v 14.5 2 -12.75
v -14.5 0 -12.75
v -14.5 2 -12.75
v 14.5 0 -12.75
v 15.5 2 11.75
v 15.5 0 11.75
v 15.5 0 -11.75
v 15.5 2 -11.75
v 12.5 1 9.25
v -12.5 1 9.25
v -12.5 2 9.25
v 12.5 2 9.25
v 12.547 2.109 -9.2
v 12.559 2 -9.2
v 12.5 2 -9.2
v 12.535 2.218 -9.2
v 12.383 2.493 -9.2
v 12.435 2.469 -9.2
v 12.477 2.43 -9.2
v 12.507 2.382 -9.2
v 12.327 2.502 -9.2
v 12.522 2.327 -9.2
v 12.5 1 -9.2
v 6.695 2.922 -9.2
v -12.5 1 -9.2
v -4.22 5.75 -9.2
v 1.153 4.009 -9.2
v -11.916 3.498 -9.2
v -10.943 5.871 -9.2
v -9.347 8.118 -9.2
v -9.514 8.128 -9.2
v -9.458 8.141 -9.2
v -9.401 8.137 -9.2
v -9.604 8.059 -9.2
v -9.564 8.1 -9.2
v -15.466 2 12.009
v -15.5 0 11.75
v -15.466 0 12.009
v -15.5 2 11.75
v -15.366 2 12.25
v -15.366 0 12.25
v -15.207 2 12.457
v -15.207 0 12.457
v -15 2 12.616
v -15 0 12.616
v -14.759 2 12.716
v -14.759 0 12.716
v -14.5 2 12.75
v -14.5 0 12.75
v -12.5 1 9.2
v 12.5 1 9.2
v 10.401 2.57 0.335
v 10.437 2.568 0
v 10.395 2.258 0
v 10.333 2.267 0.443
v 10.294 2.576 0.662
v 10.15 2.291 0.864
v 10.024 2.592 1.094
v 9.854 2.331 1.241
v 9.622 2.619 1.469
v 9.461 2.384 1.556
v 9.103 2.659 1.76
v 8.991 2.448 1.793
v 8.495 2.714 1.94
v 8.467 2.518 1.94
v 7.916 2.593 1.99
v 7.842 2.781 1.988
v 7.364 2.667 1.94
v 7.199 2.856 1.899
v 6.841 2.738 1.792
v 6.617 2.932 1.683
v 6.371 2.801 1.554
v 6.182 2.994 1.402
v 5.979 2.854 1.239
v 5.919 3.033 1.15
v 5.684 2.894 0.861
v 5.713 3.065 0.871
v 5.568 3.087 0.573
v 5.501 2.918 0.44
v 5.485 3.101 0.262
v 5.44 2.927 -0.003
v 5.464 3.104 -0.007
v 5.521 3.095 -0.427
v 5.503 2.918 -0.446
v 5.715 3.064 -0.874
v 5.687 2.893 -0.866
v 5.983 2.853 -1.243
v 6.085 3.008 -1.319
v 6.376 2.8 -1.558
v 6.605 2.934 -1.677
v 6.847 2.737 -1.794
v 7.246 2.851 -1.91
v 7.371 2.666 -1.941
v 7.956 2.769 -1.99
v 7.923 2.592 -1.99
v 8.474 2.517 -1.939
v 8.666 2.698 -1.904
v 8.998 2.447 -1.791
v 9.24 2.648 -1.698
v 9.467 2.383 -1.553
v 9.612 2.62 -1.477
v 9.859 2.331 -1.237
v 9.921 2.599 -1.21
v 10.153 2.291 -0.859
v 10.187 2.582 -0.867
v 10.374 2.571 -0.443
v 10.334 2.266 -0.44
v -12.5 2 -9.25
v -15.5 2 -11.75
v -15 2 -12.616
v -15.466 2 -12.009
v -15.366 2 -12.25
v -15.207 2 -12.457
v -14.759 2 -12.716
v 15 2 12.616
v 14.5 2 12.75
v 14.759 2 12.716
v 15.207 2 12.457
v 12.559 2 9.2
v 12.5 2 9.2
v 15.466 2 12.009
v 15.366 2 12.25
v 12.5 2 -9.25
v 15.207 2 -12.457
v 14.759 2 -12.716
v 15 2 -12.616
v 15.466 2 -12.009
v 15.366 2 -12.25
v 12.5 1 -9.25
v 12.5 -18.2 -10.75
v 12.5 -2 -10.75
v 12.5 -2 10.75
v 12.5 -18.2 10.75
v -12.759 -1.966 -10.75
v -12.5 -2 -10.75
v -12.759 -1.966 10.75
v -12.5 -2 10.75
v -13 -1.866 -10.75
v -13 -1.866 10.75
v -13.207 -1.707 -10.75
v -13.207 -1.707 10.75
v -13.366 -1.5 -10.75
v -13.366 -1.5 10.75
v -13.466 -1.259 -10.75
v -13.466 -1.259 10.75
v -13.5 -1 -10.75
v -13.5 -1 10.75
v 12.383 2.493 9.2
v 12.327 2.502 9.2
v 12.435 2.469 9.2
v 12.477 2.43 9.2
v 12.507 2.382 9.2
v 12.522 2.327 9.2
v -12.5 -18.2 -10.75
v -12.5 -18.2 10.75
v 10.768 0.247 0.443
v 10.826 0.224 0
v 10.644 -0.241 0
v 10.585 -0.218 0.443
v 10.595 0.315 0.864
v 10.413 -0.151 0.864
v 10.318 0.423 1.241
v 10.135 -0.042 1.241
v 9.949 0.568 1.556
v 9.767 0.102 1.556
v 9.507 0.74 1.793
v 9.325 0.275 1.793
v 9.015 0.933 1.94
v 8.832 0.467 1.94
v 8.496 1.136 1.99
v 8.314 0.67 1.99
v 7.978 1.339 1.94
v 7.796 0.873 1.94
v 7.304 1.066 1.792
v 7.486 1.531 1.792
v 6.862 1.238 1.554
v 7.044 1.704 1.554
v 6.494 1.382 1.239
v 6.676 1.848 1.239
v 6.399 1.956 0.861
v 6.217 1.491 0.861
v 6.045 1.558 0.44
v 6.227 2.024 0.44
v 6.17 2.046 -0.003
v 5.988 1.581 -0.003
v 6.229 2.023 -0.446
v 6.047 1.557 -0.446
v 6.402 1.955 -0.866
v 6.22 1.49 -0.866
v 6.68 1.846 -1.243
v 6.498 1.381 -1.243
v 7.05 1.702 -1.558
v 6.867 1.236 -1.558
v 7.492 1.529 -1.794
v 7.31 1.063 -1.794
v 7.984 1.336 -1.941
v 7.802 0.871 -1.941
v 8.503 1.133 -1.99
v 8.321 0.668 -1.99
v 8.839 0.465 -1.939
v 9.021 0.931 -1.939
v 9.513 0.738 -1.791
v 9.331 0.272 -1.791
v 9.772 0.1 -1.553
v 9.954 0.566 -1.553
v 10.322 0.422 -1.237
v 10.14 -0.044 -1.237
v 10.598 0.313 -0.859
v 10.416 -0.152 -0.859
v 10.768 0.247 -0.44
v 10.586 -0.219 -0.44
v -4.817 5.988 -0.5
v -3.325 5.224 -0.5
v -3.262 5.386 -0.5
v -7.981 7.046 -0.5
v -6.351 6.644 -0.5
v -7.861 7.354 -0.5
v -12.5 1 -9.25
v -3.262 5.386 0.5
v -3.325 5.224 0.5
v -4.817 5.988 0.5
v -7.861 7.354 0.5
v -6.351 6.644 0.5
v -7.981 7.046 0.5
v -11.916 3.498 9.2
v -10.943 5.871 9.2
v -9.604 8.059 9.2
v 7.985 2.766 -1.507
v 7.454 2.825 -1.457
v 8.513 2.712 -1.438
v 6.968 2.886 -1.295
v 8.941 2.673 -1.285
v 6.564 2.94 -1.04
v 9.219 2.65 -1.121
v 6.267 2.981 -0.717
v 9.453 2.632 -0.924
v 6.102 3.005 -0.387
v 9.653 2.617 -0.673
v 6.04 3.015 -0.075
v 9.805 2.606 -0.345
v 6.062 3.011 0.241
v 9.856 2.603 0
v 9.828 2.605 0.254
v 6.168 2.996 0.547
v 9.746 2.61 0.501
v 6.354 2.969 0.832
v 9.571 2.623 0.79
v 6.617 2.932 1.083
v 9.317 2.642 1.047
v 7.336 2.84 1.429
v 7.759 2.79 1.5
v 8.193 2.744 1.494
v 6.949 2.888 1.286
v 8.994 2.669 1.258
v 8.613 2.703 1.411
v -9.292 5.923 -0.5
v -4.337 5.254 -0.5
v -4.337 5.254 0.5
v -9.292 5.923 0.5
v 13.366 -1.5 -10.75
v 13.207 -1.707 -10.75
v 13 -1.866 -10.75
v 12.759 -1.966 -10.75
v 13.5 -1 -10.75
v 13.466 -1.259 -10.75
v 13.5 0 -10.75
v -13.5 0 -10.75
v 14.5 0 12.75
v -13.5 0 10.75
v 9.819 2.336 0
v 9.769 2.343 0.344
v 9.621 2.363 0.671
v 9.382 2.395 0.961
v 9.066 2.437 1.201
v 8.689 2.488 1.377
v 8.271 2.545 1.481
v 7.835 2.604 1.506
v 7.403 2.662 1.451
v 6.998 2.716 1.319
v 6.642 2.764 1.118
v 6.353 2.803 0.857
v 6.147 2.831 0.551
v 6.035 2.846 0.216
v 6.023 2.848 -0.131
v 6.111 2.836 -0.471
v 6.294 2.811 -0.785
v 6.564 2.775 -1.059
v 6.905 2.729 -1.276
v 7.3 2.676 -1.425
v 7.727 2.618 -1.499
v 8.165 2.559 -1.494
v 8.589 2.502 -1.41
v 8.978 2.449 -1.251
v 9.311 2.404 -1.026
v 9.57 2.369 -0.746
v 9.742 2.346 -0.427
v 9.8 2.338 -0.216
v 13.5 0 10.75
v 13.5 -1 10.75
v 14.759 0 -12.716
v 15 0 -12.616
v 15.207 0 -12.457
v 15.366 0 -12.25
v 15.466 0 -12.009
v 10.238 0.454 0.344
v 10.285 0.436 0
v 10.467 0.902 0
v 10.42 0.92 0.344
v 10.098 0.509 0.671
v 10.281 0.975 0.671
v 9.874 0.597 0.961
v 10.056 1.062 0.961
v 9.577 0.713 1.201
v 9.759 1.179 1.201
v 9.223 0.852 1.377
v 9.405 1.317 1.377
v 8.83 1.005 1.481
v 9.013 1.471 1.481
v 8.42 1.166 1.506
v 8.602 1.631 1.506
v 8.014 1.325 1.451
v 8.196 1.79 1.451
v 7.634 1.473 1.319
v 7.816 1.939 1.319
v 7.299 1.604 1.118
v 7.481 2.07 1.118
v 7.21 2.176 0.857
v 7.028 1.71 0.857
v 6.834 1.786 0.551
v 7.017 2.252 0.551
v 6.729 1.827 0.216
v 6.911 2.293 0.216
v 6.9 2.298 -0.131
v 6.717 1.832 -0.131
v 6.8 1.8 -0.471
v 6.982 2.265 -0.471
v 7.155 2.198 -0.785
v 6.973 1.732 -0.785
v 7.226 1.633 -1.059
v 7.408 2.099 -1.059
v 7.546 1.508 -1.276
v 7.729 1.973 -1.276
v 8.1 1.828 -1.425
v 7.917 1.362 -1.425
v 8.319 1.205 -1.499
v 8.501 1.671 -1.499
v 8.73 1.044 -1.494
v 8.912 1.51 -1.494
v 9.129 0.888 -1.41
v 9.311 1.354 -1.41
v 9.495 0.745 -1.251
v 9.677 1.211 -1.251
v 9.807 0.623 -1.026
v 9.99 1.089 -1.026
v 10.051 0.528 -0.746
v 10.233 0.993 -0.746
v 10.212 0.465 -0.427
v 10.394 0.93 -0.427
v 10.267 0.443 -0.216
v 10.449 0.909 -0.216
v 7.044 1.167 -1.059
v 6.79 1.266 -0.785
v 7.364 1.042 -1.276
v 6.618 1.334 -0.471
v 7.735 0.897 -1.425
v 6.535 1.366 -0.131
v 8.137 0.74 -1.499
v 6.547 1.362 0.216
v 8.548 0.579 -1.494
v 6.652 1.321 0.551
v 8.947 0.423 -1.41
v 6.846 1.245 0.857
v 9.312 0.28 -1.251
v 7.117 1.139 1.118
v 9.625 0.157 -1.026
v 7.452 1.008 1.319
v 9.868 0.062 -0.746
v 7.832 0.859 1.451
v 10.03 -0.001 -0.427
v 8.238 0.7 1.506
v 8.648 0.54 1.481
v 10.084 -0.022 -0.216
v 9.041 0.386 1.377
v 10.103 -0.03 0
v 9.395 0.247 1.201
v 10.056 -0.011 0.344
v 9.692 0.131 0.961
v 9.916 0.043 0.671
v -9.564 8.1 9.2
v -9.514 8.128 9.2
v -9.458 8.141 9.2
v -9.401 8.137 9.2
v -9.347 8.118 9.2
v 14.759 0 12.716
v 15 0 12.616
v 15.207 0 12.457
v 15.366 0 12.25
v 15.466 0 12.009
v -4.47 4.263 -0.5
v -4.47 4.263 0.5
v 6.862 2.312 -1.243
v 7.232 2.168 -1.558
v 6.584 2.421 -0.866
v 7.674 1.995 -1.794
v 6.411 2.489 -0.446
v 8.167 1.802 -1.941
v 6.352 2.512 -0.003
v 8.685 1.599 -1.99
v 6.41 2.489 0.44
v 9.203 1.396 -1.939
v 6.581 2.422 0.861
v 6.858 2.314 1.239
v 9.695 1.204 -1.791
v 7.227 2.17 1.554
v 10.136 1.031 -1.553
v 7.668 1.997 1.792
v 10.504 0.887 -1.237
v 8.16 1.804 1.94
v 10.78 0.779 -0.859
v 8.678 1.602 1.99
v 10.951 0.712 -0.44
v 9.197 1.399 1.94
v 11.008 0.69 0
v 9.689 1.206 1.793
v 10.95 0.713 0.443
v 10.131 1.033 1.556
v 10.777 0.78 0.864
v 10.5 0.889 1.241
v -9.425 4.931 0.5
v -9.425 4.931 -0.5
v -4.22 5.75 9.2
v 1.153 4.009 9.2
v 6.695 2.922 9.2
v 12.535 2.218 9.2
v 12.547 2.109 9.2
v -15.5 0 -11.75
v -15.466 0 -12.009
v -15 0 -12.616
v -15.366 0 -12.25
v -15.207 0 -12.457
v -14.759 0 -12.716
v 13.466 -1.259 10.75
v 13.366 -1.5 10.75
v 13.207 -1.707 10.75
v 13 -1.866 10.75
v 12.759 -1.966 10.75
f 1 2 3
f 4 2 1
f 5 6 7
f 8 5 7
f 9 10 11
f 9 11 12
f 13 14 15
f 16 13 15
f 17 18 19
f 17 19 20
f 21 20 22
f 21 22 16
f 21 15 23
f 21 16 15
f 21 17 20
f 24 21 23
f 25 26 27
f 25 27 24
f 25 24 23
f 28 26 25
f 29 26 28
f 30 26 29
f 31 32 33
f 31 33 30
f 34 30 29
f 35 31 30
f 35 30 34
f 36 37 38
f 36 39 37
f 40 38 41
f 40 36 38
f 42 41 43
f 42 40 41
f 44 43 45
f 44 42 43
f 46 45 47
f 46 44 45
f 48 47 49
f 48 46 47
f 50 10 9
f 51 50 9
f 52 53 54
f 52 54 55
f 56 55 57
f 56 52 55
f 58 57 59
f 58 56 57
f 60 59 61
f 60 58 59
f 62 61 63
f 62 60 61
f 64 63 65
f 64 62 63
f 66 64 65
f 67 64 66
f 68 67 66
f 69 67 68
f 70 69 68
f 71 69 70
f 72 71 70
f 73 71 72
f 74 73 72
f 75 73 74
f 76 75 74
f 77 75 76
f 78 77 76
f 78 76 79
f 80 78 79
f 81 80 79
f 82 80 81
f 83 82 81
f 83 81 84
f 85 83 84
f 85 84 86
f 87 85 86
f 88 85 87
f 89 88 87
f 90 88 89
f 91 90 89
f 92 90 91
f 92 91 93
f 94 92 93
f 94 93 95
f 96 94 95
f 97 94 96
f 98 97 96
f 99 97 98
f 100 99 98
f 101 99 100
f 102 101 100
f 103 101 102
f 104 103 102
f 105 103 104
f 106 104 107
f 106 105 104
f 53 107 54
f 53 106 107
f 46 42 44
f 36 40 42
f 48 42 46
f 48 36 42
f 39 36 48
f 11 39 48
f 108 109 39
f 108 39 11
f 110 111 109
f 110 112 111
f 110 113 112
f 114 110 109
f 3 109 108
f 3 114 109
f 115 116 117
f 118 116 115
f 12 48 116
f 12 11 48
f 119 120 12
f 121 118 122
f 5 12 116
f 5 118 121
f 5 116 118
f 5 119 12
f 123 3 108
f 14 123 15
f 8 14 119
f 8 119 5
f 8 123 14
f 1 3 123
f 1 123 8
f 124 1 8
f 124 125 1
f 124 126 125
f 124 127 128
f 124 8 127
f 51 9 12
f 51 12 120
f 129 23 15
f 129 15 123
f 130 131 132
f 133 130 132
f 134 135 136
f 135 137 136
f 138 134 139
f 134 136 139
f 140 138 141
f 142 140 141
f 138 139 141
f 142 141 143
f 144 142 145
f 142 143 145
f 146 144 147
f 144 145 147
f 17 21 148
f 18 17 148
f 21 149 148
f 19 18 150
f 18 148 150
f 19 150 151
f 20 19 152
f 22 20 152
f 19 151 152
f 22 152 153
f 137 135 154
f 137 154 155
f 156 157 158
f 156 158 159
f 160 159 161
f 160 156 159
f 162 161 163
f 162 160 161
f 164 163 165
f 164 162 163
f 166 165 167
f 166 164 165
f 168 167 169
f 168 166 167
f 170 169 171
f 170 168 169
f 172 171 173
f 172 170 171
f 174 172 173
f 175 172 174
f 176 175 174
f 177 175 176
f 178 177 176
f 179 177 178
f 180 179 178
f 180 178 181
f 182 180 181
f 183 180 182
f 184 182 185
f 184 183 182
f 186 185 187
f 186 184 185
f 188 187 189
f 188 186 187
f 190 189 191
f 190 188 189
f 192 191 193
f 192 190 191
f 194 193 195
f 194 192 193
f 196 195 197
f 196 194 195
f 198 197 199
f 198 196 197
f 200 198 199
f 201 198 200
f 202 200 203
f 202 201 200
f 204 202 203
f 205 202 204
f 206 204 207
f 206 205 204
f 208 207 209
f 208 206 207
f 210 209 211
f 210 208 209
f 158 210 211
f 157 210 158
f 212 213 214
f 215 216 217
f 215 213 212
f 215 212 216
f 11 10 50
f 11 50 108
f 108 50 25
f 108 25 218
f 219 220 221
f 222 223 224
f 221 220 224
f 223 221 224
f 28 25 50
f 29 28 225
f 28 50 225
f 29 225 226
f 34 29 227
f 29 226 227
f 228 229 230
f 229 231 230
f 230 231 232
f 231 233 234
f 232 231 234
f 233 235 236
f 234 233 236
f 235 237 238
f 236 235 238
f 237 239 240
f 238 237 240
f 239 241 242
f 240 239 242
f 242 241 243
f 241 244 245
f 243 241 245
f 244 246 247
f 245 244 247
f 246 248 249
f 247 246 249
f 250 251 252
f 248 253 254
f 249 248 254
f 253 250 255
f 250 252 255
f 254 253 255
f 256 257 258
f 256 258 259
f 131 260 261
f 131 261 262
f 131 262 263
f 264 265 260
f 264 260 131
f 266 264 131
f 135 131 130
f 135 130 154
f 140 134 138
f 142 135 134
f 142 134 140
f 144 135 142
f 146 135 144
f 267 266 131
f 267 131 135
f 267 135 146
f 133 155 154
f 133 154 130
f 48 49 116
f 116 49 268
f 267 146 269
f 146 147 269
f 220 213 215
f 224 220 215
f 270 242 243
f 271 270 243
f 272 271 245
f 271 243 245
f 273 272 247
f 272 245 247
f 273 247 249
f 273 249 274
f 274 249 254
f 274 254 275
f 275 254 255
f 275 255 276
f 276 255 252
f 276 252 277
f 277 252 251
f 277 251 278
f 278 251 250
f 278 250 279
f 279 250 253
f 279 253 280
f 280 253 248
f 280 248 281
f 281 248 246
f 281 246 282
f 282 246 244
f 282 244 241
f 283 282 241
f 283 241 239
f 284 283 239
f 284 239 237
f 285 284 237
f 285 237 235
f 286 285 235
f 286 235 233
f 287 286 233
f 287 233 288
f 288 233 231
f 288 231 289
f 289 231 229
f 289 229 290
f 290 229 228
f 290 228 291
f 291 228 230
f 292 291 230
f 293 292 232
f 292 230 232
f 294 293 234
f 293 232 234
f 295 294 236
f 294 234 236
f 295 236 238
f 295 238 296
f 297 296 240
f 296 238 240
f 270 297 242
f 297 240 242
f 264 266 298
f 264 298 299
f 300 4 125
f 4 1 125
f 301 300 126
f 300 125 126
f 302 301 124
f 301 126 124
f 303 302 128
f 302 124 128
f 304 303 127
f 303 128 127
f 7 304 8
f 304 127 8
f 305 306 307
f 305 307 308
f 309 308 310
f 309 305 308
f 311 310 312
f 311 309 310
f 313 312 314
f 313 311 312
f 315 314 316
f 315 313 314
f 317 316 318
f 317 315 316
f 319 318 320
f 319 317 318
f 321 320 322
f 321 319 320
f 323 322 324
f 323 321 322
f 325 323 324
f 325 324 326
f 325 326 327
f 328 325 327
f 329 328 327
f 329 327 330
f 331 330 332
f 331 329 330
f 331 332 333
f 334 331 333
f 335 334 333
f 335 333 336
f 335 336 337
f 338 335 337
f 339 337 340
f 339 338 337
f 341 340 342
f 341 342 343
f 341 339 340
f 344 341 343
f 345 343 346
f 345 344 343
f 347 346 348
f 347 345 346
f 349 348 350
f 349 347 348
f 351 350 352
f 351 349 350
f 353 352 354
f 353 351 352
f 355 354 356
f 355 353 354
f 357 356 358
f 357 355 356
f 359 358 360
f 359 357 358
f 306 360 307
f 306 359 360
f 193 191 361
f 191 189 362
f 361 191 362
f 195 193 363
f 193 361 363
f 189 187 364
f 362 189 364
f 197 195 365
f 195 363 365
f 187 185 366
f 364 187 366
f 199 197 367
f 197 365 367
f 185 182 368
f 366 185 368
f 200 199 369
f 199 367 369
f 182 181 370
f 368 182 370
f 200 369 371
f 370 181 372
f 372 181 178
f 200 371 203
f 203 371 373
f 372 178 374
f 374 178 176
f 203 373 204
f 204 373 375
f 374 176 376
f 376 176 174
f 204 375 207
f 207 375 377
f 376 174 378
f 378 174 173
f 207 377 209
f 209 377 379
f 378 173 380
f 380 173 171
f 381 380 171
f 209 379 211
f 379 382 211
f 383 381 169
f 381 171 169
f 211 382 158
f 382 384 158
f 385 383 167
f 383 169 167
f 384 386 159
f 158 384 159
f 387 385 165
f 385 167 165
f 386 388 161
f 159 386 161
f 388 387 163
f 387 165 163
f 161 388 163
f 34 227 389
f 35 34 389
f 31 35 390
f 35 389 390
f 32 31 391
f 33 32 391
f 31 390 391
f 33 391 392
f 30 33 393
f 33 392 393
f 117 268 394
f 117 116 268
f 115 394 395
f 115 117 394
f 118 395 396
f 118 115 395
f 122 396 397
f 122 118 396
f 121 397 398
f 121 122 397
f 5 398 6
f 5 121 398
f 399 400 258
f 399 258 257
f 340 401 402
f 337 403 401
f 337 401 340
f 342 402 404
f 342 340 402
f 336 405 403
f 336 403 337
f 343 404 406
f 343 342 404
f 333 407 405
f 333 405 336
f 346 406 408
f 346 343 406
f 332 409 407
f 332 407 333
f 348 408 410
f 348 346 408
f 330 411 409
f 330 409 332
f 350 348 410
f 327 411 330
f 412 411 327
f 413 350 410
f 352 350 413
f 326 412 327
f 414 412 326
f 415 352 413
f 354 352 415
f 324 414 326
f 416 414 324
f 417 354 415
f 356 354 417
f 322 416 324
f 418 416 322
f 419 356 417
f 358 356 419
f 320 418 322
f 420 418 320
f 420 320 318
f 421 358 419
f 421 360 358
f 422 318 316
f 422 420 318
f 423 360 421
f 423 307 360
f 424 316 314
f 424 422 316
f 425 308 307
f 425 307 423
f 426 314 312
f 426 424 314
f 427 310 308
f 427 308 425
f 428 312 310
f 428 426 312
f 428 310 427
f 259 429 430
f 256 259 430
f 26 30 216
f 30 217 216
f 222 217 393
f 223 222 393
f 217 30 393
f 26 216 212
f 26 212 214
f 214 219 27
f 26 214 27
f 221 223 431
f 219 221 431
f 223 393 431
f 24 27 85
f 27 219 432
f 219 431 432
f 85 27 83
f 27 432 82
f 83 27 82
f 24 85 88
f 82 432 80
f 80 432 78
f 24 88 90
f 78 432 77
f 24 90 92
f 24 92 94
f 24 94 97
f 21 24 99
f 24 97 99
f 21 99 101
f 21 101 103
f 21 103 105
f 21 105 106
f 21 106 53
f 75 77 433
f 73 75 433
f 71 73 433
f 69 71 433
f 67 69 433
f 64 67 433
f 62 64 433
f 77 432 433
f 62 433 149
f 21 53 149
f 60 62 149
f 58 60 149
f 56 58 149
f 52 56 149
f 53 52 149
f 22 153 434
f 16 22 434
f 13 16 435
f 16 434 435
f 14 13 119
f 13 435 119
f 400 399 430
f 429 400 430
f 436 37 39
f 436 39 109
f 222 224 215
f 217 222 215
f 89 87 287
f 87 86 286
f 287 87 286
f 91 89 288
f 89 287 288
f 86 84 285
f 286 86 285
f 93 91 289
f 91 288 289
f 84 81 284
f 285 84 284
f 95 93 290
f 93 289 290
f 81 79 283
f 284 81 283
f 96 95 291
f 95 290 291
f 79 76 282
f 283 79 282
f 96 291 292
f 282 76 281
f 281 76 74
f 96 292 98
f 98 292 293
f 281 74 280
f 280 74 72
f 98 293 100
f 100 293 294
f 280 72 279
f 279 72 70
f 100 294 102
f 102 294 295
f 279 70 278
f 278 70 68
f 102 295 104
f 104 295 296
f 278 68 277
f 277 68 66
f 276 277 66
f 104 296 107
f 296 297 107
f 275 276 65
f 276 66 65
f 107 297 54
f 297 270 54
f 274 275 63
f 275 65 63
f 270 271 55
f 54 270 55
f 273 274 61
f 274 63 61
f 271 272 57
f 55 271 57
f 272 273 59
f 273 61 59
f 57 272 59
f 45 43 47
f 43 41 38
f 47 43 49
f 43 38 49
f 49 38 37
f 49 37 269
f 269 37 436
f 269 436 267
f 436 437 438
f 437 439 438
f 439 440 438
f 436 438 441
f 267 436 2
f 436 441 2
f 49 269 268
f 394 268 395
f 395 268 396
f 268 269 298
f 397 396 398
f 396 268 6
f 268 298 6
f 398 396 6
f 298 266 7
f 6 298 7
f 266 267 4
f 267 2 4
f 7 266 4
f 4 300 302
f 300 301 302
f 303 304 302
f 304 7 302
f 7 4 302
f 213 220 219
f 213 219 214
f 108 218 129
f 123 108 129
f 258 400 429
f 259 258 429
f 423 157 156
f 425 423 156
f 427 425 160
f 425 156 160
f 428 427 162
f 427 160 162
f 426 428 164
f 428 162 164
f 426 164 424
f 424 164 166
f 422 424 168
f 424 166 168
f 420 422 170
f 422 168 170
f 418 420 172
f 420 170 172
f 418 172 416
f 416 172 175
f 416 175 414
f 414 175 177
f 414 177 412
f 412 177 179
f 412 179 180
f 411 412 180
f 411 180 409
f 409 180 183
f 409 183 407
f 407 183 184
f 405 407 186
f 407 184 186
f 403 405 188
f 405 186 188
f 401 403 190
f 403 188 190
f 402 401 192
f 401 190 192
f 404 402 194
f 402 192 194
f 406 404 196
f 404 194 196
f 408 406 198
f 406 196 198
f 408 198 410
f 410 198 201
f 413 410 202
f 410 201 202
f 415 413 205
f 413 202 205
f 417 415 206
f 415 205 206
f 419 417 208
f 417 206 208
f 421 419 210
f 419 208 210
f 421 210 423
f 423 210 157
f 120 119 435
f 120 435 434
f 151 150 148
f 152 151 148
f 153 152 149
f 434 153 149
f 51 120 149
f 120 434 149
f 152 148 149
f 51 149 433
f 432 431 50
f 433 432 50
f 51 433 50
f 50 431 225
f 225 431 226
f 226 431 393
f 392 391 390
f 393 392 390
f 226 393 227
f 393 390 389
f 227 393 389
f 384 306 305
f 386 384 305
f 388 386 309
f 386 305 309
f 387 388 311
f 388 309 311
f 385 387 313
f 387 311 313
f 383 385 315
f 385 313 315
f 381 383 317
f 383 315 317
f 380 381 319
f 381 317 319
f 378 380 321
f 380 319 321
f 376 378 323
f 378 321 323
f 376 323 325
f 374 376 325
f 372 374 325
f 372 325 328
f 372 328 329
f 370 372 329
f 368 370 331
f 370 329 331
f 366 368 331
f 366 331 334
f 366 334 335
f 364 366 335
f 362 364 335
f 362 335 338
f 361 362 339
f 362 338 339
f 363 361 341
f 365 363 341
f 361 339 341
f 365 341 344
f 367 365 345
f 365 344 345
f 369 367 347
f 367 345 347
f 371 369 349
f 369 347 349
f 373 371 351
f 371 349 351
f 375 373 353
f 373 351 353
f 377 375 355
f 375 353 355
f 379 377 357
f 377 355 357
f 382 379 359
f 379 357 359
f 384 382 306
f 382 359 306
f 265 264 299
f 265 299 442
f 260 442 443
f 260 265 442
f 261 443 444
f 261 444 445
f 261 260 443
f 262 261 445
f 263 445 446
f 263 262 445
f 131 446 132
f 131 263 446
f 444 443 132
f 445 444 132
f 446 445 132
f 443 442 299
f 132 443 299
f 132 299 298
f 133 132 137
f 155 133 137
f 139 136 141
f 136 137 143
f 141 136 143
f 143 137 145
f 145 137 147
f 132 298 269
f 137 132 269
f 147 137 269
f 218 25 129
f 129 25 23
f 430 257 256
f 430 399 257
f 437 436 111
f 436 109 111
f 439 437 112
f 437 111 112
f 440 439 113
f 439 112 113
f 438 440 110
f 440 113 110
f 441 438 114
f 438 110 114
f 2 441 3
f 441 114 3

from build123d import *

# Parameters (mm, degrees)
CROQUIS1_W                   = 31
CROQUIS1_H                   = 25.5
CROQUIS1_W_2                 = 25
CROQUIS1_H_2                 = 18.5
SALIENTE_EXTRUIR1_DEPTH      = 2
REDONDEO1_R                  = 1
CROQUIS2_W                   = 25
CROQUIS2_H                   = 21.5
SALIENTE_EXTRUIR5_DEPTH      = 18.2
SALIENTE_EXTRUIR5_DEPTH_BACK = 1
SALIENTE_EXTRUIR6_DEPTH      = 10.75
SALIENTE_EXTRUIR7_DEPTH      = 9.2
CROQUIS7_RX                  = 2.5
CROQUIS7_RY                  = 1.989859087
CROQUIS7_RX_2                = 1.919157188
CROQUIS7_RY_2                = 1.506996734
CROQUIS7_W                   = 5
CROQUIS7_H                   = 1
CORTAR_EXTRUIR2_DEPTH        = 0.5
CROQUIS8_RX                  = 2.5
CROQUIS8_RY                  = 1.989859087
CROQUIS8_RX_2                = 1.919157188
CROQUIS8_RY_2                = 1.506996734
CROQUIS8_W                   = 5
CROQUIS8_H                   = 1
CORTAR_EXTRUIR3_DEPTH        = 0.5


with BuildPart() as part:
    # Croquis1 → Saliente-Extruir1 (new body)
    with BuildSketch(Plane(origin=(0, 0, 0), x_dir=(1, 0, 0), z_dir=(0, 1, 0))):
        Rectangle(CROQUIS1_W, CROQUIS1_H)
        Rectangle(CROQUIS1_W_2, CROQUIS1_H_2, mode=Mode.SUBTRACT)
    extrude(amount=SALIENTE_EXTRUIR1_DEPTH)

    # Redondeo1
    redondeo1_edges = [part.edges().sort_by_distance(p)[0] for p in [
        (15.5, 1, 12.75),
        (-15.5, 1, 12.75),
        (-15.5, 1, -12.75),
        (15.5, 1, -12.75),
    ]]
    fillet(redondeo1_edges, radius=REDONDEO1_R)

    # Croquis2 → Saliente-Extruir5 (add, two sides)
    with BuildSketch(Plane.XZ) as saliente_extruir5_sk:
        Rectangle(CROQUIS2_W, CROQUIS2_H)
    extrude(amount=SALIENTE_EXTRUIR5_DEPTH)
    extrude(saliente_extruir5_sk.sketch, amount=-SALIENTE_EXTRUIR5_DEPTH_BACK)

    # Croquis3 → Saliente-Extruir6 (add, symmetric)
    with BuildSketch(Plane.XY):
        with BuildLine():
            Line((12.5, 0), (13.5, 0))
            Line((13.5, 0), (13.5, -1))
            ThreePointArc((13.5, -1), (13.207106781, -1.707106781), (12.5, -2))
            Line((12.5, -2), (12.5, 0))
        make_face()
        with BuildLine():
            Line((-12.5, 0), (-12.5, -2))
            ThreePointArc((-12.5, -2), (-13.207106781, -1.707106781), (-13.5, -1))
            Line((-13.5, -1), (-13.5, 0))
            Line((-13.5, 0), (-12.5, 0))
        make_face()
    extrude(amount=SALIENTE_EXTRUIR6_DEPTH, both=True)

    # Croquis4 → Saliente-Extruir7 (add, symmetric)
    with BuildSketch(Plane.XY):
        with BuildLine():
            ThreePointArc((-9.347385872, 8.117762074), (1.152636372, 4.009298277), (12.326652836, 2.502215681))
            ThreePointArc((12.326652836, 2.502215681), (12.45734879, 2.45105267), (12.522240679, 2.326601358))
            ThreePointArc((12.522240679, 2.326601358), (12.589620665, 1.664412167), (12.62950875, 1))
            ThreePointArc((12.62950875, 1), (0.064754375, -1.4616694), (-12.5, 1))
            ThreePointArc((-12.5, 1), (-11.477075864, 4.704087901), (-9.603642409, 8.059216522))
            ThreePointArc((-9.603642409, 8.059216522), (-9.48648288, 8.136499966), (-9.347385872, 8.117762074))
        make_face()
    extrude(amount=SALIENTE_EXTRUIR7_DEPTH, both=True)

    # Croquis7 → Cortar-Extruir2 (cut, symmetric)
    with BuildSketch(Plane(origin=(1.513513313, 3.868093829, 0), x_dir=(-0.93125002, 0.364380846, 0), z_dir=(-0.364380846, -0.93125002, 0))):
        with Locations(Location((-7.5, 0), (0, 0, -180))):
            Ellipse(CROQUIS7_RX, CROQUIS7_RY)
        with Locations(Location((-7.5, 0), (0, 0, -180))):
            Ellipse(CROQUIS7_RX_2, CROQUIS7_RY_2, mode=Mode.SUBTRACT)
        with Locations((7.5, 0)):
            Rectangle(CROQUIS7_W, CROQUIS7_H)
    extrude(amount=CORTAR_EXTRUIR2_DEPTH, both=True, mode=Mode.SUBTRACT)

    # Croquis8 → Cortar-Extruir3 (cut, symmetric)
    with BuildSketch(Plane(origin=(0.55168143, 4.090351383, 0), x_dir=(-0.991026762, 0.133663593, 0), z_dir=(-0.133663593, -0.991026762, 0))):
        with Locations(Location((-7.5, 0), (0, 0, -180))):
            Ellipse(CROQUIS8_RX, CROQUIS8_RY)
        with Locations(Location((-7.5, 0), (0, 0, -180))):
            Ellipse(CROQUIS8_RX_2, CROQUIS8_RY_2, mode=Mode.SUBTRACT)
        with Locations((7.5, 0)):
            Rectangle(CROQUIS8_W, CROQUIS8_H)
    extrude(amount=CORTAR_EXTRUIR3_DEPTH, both=True, mode=Mode.SUBTRACT)


solid = part.part
